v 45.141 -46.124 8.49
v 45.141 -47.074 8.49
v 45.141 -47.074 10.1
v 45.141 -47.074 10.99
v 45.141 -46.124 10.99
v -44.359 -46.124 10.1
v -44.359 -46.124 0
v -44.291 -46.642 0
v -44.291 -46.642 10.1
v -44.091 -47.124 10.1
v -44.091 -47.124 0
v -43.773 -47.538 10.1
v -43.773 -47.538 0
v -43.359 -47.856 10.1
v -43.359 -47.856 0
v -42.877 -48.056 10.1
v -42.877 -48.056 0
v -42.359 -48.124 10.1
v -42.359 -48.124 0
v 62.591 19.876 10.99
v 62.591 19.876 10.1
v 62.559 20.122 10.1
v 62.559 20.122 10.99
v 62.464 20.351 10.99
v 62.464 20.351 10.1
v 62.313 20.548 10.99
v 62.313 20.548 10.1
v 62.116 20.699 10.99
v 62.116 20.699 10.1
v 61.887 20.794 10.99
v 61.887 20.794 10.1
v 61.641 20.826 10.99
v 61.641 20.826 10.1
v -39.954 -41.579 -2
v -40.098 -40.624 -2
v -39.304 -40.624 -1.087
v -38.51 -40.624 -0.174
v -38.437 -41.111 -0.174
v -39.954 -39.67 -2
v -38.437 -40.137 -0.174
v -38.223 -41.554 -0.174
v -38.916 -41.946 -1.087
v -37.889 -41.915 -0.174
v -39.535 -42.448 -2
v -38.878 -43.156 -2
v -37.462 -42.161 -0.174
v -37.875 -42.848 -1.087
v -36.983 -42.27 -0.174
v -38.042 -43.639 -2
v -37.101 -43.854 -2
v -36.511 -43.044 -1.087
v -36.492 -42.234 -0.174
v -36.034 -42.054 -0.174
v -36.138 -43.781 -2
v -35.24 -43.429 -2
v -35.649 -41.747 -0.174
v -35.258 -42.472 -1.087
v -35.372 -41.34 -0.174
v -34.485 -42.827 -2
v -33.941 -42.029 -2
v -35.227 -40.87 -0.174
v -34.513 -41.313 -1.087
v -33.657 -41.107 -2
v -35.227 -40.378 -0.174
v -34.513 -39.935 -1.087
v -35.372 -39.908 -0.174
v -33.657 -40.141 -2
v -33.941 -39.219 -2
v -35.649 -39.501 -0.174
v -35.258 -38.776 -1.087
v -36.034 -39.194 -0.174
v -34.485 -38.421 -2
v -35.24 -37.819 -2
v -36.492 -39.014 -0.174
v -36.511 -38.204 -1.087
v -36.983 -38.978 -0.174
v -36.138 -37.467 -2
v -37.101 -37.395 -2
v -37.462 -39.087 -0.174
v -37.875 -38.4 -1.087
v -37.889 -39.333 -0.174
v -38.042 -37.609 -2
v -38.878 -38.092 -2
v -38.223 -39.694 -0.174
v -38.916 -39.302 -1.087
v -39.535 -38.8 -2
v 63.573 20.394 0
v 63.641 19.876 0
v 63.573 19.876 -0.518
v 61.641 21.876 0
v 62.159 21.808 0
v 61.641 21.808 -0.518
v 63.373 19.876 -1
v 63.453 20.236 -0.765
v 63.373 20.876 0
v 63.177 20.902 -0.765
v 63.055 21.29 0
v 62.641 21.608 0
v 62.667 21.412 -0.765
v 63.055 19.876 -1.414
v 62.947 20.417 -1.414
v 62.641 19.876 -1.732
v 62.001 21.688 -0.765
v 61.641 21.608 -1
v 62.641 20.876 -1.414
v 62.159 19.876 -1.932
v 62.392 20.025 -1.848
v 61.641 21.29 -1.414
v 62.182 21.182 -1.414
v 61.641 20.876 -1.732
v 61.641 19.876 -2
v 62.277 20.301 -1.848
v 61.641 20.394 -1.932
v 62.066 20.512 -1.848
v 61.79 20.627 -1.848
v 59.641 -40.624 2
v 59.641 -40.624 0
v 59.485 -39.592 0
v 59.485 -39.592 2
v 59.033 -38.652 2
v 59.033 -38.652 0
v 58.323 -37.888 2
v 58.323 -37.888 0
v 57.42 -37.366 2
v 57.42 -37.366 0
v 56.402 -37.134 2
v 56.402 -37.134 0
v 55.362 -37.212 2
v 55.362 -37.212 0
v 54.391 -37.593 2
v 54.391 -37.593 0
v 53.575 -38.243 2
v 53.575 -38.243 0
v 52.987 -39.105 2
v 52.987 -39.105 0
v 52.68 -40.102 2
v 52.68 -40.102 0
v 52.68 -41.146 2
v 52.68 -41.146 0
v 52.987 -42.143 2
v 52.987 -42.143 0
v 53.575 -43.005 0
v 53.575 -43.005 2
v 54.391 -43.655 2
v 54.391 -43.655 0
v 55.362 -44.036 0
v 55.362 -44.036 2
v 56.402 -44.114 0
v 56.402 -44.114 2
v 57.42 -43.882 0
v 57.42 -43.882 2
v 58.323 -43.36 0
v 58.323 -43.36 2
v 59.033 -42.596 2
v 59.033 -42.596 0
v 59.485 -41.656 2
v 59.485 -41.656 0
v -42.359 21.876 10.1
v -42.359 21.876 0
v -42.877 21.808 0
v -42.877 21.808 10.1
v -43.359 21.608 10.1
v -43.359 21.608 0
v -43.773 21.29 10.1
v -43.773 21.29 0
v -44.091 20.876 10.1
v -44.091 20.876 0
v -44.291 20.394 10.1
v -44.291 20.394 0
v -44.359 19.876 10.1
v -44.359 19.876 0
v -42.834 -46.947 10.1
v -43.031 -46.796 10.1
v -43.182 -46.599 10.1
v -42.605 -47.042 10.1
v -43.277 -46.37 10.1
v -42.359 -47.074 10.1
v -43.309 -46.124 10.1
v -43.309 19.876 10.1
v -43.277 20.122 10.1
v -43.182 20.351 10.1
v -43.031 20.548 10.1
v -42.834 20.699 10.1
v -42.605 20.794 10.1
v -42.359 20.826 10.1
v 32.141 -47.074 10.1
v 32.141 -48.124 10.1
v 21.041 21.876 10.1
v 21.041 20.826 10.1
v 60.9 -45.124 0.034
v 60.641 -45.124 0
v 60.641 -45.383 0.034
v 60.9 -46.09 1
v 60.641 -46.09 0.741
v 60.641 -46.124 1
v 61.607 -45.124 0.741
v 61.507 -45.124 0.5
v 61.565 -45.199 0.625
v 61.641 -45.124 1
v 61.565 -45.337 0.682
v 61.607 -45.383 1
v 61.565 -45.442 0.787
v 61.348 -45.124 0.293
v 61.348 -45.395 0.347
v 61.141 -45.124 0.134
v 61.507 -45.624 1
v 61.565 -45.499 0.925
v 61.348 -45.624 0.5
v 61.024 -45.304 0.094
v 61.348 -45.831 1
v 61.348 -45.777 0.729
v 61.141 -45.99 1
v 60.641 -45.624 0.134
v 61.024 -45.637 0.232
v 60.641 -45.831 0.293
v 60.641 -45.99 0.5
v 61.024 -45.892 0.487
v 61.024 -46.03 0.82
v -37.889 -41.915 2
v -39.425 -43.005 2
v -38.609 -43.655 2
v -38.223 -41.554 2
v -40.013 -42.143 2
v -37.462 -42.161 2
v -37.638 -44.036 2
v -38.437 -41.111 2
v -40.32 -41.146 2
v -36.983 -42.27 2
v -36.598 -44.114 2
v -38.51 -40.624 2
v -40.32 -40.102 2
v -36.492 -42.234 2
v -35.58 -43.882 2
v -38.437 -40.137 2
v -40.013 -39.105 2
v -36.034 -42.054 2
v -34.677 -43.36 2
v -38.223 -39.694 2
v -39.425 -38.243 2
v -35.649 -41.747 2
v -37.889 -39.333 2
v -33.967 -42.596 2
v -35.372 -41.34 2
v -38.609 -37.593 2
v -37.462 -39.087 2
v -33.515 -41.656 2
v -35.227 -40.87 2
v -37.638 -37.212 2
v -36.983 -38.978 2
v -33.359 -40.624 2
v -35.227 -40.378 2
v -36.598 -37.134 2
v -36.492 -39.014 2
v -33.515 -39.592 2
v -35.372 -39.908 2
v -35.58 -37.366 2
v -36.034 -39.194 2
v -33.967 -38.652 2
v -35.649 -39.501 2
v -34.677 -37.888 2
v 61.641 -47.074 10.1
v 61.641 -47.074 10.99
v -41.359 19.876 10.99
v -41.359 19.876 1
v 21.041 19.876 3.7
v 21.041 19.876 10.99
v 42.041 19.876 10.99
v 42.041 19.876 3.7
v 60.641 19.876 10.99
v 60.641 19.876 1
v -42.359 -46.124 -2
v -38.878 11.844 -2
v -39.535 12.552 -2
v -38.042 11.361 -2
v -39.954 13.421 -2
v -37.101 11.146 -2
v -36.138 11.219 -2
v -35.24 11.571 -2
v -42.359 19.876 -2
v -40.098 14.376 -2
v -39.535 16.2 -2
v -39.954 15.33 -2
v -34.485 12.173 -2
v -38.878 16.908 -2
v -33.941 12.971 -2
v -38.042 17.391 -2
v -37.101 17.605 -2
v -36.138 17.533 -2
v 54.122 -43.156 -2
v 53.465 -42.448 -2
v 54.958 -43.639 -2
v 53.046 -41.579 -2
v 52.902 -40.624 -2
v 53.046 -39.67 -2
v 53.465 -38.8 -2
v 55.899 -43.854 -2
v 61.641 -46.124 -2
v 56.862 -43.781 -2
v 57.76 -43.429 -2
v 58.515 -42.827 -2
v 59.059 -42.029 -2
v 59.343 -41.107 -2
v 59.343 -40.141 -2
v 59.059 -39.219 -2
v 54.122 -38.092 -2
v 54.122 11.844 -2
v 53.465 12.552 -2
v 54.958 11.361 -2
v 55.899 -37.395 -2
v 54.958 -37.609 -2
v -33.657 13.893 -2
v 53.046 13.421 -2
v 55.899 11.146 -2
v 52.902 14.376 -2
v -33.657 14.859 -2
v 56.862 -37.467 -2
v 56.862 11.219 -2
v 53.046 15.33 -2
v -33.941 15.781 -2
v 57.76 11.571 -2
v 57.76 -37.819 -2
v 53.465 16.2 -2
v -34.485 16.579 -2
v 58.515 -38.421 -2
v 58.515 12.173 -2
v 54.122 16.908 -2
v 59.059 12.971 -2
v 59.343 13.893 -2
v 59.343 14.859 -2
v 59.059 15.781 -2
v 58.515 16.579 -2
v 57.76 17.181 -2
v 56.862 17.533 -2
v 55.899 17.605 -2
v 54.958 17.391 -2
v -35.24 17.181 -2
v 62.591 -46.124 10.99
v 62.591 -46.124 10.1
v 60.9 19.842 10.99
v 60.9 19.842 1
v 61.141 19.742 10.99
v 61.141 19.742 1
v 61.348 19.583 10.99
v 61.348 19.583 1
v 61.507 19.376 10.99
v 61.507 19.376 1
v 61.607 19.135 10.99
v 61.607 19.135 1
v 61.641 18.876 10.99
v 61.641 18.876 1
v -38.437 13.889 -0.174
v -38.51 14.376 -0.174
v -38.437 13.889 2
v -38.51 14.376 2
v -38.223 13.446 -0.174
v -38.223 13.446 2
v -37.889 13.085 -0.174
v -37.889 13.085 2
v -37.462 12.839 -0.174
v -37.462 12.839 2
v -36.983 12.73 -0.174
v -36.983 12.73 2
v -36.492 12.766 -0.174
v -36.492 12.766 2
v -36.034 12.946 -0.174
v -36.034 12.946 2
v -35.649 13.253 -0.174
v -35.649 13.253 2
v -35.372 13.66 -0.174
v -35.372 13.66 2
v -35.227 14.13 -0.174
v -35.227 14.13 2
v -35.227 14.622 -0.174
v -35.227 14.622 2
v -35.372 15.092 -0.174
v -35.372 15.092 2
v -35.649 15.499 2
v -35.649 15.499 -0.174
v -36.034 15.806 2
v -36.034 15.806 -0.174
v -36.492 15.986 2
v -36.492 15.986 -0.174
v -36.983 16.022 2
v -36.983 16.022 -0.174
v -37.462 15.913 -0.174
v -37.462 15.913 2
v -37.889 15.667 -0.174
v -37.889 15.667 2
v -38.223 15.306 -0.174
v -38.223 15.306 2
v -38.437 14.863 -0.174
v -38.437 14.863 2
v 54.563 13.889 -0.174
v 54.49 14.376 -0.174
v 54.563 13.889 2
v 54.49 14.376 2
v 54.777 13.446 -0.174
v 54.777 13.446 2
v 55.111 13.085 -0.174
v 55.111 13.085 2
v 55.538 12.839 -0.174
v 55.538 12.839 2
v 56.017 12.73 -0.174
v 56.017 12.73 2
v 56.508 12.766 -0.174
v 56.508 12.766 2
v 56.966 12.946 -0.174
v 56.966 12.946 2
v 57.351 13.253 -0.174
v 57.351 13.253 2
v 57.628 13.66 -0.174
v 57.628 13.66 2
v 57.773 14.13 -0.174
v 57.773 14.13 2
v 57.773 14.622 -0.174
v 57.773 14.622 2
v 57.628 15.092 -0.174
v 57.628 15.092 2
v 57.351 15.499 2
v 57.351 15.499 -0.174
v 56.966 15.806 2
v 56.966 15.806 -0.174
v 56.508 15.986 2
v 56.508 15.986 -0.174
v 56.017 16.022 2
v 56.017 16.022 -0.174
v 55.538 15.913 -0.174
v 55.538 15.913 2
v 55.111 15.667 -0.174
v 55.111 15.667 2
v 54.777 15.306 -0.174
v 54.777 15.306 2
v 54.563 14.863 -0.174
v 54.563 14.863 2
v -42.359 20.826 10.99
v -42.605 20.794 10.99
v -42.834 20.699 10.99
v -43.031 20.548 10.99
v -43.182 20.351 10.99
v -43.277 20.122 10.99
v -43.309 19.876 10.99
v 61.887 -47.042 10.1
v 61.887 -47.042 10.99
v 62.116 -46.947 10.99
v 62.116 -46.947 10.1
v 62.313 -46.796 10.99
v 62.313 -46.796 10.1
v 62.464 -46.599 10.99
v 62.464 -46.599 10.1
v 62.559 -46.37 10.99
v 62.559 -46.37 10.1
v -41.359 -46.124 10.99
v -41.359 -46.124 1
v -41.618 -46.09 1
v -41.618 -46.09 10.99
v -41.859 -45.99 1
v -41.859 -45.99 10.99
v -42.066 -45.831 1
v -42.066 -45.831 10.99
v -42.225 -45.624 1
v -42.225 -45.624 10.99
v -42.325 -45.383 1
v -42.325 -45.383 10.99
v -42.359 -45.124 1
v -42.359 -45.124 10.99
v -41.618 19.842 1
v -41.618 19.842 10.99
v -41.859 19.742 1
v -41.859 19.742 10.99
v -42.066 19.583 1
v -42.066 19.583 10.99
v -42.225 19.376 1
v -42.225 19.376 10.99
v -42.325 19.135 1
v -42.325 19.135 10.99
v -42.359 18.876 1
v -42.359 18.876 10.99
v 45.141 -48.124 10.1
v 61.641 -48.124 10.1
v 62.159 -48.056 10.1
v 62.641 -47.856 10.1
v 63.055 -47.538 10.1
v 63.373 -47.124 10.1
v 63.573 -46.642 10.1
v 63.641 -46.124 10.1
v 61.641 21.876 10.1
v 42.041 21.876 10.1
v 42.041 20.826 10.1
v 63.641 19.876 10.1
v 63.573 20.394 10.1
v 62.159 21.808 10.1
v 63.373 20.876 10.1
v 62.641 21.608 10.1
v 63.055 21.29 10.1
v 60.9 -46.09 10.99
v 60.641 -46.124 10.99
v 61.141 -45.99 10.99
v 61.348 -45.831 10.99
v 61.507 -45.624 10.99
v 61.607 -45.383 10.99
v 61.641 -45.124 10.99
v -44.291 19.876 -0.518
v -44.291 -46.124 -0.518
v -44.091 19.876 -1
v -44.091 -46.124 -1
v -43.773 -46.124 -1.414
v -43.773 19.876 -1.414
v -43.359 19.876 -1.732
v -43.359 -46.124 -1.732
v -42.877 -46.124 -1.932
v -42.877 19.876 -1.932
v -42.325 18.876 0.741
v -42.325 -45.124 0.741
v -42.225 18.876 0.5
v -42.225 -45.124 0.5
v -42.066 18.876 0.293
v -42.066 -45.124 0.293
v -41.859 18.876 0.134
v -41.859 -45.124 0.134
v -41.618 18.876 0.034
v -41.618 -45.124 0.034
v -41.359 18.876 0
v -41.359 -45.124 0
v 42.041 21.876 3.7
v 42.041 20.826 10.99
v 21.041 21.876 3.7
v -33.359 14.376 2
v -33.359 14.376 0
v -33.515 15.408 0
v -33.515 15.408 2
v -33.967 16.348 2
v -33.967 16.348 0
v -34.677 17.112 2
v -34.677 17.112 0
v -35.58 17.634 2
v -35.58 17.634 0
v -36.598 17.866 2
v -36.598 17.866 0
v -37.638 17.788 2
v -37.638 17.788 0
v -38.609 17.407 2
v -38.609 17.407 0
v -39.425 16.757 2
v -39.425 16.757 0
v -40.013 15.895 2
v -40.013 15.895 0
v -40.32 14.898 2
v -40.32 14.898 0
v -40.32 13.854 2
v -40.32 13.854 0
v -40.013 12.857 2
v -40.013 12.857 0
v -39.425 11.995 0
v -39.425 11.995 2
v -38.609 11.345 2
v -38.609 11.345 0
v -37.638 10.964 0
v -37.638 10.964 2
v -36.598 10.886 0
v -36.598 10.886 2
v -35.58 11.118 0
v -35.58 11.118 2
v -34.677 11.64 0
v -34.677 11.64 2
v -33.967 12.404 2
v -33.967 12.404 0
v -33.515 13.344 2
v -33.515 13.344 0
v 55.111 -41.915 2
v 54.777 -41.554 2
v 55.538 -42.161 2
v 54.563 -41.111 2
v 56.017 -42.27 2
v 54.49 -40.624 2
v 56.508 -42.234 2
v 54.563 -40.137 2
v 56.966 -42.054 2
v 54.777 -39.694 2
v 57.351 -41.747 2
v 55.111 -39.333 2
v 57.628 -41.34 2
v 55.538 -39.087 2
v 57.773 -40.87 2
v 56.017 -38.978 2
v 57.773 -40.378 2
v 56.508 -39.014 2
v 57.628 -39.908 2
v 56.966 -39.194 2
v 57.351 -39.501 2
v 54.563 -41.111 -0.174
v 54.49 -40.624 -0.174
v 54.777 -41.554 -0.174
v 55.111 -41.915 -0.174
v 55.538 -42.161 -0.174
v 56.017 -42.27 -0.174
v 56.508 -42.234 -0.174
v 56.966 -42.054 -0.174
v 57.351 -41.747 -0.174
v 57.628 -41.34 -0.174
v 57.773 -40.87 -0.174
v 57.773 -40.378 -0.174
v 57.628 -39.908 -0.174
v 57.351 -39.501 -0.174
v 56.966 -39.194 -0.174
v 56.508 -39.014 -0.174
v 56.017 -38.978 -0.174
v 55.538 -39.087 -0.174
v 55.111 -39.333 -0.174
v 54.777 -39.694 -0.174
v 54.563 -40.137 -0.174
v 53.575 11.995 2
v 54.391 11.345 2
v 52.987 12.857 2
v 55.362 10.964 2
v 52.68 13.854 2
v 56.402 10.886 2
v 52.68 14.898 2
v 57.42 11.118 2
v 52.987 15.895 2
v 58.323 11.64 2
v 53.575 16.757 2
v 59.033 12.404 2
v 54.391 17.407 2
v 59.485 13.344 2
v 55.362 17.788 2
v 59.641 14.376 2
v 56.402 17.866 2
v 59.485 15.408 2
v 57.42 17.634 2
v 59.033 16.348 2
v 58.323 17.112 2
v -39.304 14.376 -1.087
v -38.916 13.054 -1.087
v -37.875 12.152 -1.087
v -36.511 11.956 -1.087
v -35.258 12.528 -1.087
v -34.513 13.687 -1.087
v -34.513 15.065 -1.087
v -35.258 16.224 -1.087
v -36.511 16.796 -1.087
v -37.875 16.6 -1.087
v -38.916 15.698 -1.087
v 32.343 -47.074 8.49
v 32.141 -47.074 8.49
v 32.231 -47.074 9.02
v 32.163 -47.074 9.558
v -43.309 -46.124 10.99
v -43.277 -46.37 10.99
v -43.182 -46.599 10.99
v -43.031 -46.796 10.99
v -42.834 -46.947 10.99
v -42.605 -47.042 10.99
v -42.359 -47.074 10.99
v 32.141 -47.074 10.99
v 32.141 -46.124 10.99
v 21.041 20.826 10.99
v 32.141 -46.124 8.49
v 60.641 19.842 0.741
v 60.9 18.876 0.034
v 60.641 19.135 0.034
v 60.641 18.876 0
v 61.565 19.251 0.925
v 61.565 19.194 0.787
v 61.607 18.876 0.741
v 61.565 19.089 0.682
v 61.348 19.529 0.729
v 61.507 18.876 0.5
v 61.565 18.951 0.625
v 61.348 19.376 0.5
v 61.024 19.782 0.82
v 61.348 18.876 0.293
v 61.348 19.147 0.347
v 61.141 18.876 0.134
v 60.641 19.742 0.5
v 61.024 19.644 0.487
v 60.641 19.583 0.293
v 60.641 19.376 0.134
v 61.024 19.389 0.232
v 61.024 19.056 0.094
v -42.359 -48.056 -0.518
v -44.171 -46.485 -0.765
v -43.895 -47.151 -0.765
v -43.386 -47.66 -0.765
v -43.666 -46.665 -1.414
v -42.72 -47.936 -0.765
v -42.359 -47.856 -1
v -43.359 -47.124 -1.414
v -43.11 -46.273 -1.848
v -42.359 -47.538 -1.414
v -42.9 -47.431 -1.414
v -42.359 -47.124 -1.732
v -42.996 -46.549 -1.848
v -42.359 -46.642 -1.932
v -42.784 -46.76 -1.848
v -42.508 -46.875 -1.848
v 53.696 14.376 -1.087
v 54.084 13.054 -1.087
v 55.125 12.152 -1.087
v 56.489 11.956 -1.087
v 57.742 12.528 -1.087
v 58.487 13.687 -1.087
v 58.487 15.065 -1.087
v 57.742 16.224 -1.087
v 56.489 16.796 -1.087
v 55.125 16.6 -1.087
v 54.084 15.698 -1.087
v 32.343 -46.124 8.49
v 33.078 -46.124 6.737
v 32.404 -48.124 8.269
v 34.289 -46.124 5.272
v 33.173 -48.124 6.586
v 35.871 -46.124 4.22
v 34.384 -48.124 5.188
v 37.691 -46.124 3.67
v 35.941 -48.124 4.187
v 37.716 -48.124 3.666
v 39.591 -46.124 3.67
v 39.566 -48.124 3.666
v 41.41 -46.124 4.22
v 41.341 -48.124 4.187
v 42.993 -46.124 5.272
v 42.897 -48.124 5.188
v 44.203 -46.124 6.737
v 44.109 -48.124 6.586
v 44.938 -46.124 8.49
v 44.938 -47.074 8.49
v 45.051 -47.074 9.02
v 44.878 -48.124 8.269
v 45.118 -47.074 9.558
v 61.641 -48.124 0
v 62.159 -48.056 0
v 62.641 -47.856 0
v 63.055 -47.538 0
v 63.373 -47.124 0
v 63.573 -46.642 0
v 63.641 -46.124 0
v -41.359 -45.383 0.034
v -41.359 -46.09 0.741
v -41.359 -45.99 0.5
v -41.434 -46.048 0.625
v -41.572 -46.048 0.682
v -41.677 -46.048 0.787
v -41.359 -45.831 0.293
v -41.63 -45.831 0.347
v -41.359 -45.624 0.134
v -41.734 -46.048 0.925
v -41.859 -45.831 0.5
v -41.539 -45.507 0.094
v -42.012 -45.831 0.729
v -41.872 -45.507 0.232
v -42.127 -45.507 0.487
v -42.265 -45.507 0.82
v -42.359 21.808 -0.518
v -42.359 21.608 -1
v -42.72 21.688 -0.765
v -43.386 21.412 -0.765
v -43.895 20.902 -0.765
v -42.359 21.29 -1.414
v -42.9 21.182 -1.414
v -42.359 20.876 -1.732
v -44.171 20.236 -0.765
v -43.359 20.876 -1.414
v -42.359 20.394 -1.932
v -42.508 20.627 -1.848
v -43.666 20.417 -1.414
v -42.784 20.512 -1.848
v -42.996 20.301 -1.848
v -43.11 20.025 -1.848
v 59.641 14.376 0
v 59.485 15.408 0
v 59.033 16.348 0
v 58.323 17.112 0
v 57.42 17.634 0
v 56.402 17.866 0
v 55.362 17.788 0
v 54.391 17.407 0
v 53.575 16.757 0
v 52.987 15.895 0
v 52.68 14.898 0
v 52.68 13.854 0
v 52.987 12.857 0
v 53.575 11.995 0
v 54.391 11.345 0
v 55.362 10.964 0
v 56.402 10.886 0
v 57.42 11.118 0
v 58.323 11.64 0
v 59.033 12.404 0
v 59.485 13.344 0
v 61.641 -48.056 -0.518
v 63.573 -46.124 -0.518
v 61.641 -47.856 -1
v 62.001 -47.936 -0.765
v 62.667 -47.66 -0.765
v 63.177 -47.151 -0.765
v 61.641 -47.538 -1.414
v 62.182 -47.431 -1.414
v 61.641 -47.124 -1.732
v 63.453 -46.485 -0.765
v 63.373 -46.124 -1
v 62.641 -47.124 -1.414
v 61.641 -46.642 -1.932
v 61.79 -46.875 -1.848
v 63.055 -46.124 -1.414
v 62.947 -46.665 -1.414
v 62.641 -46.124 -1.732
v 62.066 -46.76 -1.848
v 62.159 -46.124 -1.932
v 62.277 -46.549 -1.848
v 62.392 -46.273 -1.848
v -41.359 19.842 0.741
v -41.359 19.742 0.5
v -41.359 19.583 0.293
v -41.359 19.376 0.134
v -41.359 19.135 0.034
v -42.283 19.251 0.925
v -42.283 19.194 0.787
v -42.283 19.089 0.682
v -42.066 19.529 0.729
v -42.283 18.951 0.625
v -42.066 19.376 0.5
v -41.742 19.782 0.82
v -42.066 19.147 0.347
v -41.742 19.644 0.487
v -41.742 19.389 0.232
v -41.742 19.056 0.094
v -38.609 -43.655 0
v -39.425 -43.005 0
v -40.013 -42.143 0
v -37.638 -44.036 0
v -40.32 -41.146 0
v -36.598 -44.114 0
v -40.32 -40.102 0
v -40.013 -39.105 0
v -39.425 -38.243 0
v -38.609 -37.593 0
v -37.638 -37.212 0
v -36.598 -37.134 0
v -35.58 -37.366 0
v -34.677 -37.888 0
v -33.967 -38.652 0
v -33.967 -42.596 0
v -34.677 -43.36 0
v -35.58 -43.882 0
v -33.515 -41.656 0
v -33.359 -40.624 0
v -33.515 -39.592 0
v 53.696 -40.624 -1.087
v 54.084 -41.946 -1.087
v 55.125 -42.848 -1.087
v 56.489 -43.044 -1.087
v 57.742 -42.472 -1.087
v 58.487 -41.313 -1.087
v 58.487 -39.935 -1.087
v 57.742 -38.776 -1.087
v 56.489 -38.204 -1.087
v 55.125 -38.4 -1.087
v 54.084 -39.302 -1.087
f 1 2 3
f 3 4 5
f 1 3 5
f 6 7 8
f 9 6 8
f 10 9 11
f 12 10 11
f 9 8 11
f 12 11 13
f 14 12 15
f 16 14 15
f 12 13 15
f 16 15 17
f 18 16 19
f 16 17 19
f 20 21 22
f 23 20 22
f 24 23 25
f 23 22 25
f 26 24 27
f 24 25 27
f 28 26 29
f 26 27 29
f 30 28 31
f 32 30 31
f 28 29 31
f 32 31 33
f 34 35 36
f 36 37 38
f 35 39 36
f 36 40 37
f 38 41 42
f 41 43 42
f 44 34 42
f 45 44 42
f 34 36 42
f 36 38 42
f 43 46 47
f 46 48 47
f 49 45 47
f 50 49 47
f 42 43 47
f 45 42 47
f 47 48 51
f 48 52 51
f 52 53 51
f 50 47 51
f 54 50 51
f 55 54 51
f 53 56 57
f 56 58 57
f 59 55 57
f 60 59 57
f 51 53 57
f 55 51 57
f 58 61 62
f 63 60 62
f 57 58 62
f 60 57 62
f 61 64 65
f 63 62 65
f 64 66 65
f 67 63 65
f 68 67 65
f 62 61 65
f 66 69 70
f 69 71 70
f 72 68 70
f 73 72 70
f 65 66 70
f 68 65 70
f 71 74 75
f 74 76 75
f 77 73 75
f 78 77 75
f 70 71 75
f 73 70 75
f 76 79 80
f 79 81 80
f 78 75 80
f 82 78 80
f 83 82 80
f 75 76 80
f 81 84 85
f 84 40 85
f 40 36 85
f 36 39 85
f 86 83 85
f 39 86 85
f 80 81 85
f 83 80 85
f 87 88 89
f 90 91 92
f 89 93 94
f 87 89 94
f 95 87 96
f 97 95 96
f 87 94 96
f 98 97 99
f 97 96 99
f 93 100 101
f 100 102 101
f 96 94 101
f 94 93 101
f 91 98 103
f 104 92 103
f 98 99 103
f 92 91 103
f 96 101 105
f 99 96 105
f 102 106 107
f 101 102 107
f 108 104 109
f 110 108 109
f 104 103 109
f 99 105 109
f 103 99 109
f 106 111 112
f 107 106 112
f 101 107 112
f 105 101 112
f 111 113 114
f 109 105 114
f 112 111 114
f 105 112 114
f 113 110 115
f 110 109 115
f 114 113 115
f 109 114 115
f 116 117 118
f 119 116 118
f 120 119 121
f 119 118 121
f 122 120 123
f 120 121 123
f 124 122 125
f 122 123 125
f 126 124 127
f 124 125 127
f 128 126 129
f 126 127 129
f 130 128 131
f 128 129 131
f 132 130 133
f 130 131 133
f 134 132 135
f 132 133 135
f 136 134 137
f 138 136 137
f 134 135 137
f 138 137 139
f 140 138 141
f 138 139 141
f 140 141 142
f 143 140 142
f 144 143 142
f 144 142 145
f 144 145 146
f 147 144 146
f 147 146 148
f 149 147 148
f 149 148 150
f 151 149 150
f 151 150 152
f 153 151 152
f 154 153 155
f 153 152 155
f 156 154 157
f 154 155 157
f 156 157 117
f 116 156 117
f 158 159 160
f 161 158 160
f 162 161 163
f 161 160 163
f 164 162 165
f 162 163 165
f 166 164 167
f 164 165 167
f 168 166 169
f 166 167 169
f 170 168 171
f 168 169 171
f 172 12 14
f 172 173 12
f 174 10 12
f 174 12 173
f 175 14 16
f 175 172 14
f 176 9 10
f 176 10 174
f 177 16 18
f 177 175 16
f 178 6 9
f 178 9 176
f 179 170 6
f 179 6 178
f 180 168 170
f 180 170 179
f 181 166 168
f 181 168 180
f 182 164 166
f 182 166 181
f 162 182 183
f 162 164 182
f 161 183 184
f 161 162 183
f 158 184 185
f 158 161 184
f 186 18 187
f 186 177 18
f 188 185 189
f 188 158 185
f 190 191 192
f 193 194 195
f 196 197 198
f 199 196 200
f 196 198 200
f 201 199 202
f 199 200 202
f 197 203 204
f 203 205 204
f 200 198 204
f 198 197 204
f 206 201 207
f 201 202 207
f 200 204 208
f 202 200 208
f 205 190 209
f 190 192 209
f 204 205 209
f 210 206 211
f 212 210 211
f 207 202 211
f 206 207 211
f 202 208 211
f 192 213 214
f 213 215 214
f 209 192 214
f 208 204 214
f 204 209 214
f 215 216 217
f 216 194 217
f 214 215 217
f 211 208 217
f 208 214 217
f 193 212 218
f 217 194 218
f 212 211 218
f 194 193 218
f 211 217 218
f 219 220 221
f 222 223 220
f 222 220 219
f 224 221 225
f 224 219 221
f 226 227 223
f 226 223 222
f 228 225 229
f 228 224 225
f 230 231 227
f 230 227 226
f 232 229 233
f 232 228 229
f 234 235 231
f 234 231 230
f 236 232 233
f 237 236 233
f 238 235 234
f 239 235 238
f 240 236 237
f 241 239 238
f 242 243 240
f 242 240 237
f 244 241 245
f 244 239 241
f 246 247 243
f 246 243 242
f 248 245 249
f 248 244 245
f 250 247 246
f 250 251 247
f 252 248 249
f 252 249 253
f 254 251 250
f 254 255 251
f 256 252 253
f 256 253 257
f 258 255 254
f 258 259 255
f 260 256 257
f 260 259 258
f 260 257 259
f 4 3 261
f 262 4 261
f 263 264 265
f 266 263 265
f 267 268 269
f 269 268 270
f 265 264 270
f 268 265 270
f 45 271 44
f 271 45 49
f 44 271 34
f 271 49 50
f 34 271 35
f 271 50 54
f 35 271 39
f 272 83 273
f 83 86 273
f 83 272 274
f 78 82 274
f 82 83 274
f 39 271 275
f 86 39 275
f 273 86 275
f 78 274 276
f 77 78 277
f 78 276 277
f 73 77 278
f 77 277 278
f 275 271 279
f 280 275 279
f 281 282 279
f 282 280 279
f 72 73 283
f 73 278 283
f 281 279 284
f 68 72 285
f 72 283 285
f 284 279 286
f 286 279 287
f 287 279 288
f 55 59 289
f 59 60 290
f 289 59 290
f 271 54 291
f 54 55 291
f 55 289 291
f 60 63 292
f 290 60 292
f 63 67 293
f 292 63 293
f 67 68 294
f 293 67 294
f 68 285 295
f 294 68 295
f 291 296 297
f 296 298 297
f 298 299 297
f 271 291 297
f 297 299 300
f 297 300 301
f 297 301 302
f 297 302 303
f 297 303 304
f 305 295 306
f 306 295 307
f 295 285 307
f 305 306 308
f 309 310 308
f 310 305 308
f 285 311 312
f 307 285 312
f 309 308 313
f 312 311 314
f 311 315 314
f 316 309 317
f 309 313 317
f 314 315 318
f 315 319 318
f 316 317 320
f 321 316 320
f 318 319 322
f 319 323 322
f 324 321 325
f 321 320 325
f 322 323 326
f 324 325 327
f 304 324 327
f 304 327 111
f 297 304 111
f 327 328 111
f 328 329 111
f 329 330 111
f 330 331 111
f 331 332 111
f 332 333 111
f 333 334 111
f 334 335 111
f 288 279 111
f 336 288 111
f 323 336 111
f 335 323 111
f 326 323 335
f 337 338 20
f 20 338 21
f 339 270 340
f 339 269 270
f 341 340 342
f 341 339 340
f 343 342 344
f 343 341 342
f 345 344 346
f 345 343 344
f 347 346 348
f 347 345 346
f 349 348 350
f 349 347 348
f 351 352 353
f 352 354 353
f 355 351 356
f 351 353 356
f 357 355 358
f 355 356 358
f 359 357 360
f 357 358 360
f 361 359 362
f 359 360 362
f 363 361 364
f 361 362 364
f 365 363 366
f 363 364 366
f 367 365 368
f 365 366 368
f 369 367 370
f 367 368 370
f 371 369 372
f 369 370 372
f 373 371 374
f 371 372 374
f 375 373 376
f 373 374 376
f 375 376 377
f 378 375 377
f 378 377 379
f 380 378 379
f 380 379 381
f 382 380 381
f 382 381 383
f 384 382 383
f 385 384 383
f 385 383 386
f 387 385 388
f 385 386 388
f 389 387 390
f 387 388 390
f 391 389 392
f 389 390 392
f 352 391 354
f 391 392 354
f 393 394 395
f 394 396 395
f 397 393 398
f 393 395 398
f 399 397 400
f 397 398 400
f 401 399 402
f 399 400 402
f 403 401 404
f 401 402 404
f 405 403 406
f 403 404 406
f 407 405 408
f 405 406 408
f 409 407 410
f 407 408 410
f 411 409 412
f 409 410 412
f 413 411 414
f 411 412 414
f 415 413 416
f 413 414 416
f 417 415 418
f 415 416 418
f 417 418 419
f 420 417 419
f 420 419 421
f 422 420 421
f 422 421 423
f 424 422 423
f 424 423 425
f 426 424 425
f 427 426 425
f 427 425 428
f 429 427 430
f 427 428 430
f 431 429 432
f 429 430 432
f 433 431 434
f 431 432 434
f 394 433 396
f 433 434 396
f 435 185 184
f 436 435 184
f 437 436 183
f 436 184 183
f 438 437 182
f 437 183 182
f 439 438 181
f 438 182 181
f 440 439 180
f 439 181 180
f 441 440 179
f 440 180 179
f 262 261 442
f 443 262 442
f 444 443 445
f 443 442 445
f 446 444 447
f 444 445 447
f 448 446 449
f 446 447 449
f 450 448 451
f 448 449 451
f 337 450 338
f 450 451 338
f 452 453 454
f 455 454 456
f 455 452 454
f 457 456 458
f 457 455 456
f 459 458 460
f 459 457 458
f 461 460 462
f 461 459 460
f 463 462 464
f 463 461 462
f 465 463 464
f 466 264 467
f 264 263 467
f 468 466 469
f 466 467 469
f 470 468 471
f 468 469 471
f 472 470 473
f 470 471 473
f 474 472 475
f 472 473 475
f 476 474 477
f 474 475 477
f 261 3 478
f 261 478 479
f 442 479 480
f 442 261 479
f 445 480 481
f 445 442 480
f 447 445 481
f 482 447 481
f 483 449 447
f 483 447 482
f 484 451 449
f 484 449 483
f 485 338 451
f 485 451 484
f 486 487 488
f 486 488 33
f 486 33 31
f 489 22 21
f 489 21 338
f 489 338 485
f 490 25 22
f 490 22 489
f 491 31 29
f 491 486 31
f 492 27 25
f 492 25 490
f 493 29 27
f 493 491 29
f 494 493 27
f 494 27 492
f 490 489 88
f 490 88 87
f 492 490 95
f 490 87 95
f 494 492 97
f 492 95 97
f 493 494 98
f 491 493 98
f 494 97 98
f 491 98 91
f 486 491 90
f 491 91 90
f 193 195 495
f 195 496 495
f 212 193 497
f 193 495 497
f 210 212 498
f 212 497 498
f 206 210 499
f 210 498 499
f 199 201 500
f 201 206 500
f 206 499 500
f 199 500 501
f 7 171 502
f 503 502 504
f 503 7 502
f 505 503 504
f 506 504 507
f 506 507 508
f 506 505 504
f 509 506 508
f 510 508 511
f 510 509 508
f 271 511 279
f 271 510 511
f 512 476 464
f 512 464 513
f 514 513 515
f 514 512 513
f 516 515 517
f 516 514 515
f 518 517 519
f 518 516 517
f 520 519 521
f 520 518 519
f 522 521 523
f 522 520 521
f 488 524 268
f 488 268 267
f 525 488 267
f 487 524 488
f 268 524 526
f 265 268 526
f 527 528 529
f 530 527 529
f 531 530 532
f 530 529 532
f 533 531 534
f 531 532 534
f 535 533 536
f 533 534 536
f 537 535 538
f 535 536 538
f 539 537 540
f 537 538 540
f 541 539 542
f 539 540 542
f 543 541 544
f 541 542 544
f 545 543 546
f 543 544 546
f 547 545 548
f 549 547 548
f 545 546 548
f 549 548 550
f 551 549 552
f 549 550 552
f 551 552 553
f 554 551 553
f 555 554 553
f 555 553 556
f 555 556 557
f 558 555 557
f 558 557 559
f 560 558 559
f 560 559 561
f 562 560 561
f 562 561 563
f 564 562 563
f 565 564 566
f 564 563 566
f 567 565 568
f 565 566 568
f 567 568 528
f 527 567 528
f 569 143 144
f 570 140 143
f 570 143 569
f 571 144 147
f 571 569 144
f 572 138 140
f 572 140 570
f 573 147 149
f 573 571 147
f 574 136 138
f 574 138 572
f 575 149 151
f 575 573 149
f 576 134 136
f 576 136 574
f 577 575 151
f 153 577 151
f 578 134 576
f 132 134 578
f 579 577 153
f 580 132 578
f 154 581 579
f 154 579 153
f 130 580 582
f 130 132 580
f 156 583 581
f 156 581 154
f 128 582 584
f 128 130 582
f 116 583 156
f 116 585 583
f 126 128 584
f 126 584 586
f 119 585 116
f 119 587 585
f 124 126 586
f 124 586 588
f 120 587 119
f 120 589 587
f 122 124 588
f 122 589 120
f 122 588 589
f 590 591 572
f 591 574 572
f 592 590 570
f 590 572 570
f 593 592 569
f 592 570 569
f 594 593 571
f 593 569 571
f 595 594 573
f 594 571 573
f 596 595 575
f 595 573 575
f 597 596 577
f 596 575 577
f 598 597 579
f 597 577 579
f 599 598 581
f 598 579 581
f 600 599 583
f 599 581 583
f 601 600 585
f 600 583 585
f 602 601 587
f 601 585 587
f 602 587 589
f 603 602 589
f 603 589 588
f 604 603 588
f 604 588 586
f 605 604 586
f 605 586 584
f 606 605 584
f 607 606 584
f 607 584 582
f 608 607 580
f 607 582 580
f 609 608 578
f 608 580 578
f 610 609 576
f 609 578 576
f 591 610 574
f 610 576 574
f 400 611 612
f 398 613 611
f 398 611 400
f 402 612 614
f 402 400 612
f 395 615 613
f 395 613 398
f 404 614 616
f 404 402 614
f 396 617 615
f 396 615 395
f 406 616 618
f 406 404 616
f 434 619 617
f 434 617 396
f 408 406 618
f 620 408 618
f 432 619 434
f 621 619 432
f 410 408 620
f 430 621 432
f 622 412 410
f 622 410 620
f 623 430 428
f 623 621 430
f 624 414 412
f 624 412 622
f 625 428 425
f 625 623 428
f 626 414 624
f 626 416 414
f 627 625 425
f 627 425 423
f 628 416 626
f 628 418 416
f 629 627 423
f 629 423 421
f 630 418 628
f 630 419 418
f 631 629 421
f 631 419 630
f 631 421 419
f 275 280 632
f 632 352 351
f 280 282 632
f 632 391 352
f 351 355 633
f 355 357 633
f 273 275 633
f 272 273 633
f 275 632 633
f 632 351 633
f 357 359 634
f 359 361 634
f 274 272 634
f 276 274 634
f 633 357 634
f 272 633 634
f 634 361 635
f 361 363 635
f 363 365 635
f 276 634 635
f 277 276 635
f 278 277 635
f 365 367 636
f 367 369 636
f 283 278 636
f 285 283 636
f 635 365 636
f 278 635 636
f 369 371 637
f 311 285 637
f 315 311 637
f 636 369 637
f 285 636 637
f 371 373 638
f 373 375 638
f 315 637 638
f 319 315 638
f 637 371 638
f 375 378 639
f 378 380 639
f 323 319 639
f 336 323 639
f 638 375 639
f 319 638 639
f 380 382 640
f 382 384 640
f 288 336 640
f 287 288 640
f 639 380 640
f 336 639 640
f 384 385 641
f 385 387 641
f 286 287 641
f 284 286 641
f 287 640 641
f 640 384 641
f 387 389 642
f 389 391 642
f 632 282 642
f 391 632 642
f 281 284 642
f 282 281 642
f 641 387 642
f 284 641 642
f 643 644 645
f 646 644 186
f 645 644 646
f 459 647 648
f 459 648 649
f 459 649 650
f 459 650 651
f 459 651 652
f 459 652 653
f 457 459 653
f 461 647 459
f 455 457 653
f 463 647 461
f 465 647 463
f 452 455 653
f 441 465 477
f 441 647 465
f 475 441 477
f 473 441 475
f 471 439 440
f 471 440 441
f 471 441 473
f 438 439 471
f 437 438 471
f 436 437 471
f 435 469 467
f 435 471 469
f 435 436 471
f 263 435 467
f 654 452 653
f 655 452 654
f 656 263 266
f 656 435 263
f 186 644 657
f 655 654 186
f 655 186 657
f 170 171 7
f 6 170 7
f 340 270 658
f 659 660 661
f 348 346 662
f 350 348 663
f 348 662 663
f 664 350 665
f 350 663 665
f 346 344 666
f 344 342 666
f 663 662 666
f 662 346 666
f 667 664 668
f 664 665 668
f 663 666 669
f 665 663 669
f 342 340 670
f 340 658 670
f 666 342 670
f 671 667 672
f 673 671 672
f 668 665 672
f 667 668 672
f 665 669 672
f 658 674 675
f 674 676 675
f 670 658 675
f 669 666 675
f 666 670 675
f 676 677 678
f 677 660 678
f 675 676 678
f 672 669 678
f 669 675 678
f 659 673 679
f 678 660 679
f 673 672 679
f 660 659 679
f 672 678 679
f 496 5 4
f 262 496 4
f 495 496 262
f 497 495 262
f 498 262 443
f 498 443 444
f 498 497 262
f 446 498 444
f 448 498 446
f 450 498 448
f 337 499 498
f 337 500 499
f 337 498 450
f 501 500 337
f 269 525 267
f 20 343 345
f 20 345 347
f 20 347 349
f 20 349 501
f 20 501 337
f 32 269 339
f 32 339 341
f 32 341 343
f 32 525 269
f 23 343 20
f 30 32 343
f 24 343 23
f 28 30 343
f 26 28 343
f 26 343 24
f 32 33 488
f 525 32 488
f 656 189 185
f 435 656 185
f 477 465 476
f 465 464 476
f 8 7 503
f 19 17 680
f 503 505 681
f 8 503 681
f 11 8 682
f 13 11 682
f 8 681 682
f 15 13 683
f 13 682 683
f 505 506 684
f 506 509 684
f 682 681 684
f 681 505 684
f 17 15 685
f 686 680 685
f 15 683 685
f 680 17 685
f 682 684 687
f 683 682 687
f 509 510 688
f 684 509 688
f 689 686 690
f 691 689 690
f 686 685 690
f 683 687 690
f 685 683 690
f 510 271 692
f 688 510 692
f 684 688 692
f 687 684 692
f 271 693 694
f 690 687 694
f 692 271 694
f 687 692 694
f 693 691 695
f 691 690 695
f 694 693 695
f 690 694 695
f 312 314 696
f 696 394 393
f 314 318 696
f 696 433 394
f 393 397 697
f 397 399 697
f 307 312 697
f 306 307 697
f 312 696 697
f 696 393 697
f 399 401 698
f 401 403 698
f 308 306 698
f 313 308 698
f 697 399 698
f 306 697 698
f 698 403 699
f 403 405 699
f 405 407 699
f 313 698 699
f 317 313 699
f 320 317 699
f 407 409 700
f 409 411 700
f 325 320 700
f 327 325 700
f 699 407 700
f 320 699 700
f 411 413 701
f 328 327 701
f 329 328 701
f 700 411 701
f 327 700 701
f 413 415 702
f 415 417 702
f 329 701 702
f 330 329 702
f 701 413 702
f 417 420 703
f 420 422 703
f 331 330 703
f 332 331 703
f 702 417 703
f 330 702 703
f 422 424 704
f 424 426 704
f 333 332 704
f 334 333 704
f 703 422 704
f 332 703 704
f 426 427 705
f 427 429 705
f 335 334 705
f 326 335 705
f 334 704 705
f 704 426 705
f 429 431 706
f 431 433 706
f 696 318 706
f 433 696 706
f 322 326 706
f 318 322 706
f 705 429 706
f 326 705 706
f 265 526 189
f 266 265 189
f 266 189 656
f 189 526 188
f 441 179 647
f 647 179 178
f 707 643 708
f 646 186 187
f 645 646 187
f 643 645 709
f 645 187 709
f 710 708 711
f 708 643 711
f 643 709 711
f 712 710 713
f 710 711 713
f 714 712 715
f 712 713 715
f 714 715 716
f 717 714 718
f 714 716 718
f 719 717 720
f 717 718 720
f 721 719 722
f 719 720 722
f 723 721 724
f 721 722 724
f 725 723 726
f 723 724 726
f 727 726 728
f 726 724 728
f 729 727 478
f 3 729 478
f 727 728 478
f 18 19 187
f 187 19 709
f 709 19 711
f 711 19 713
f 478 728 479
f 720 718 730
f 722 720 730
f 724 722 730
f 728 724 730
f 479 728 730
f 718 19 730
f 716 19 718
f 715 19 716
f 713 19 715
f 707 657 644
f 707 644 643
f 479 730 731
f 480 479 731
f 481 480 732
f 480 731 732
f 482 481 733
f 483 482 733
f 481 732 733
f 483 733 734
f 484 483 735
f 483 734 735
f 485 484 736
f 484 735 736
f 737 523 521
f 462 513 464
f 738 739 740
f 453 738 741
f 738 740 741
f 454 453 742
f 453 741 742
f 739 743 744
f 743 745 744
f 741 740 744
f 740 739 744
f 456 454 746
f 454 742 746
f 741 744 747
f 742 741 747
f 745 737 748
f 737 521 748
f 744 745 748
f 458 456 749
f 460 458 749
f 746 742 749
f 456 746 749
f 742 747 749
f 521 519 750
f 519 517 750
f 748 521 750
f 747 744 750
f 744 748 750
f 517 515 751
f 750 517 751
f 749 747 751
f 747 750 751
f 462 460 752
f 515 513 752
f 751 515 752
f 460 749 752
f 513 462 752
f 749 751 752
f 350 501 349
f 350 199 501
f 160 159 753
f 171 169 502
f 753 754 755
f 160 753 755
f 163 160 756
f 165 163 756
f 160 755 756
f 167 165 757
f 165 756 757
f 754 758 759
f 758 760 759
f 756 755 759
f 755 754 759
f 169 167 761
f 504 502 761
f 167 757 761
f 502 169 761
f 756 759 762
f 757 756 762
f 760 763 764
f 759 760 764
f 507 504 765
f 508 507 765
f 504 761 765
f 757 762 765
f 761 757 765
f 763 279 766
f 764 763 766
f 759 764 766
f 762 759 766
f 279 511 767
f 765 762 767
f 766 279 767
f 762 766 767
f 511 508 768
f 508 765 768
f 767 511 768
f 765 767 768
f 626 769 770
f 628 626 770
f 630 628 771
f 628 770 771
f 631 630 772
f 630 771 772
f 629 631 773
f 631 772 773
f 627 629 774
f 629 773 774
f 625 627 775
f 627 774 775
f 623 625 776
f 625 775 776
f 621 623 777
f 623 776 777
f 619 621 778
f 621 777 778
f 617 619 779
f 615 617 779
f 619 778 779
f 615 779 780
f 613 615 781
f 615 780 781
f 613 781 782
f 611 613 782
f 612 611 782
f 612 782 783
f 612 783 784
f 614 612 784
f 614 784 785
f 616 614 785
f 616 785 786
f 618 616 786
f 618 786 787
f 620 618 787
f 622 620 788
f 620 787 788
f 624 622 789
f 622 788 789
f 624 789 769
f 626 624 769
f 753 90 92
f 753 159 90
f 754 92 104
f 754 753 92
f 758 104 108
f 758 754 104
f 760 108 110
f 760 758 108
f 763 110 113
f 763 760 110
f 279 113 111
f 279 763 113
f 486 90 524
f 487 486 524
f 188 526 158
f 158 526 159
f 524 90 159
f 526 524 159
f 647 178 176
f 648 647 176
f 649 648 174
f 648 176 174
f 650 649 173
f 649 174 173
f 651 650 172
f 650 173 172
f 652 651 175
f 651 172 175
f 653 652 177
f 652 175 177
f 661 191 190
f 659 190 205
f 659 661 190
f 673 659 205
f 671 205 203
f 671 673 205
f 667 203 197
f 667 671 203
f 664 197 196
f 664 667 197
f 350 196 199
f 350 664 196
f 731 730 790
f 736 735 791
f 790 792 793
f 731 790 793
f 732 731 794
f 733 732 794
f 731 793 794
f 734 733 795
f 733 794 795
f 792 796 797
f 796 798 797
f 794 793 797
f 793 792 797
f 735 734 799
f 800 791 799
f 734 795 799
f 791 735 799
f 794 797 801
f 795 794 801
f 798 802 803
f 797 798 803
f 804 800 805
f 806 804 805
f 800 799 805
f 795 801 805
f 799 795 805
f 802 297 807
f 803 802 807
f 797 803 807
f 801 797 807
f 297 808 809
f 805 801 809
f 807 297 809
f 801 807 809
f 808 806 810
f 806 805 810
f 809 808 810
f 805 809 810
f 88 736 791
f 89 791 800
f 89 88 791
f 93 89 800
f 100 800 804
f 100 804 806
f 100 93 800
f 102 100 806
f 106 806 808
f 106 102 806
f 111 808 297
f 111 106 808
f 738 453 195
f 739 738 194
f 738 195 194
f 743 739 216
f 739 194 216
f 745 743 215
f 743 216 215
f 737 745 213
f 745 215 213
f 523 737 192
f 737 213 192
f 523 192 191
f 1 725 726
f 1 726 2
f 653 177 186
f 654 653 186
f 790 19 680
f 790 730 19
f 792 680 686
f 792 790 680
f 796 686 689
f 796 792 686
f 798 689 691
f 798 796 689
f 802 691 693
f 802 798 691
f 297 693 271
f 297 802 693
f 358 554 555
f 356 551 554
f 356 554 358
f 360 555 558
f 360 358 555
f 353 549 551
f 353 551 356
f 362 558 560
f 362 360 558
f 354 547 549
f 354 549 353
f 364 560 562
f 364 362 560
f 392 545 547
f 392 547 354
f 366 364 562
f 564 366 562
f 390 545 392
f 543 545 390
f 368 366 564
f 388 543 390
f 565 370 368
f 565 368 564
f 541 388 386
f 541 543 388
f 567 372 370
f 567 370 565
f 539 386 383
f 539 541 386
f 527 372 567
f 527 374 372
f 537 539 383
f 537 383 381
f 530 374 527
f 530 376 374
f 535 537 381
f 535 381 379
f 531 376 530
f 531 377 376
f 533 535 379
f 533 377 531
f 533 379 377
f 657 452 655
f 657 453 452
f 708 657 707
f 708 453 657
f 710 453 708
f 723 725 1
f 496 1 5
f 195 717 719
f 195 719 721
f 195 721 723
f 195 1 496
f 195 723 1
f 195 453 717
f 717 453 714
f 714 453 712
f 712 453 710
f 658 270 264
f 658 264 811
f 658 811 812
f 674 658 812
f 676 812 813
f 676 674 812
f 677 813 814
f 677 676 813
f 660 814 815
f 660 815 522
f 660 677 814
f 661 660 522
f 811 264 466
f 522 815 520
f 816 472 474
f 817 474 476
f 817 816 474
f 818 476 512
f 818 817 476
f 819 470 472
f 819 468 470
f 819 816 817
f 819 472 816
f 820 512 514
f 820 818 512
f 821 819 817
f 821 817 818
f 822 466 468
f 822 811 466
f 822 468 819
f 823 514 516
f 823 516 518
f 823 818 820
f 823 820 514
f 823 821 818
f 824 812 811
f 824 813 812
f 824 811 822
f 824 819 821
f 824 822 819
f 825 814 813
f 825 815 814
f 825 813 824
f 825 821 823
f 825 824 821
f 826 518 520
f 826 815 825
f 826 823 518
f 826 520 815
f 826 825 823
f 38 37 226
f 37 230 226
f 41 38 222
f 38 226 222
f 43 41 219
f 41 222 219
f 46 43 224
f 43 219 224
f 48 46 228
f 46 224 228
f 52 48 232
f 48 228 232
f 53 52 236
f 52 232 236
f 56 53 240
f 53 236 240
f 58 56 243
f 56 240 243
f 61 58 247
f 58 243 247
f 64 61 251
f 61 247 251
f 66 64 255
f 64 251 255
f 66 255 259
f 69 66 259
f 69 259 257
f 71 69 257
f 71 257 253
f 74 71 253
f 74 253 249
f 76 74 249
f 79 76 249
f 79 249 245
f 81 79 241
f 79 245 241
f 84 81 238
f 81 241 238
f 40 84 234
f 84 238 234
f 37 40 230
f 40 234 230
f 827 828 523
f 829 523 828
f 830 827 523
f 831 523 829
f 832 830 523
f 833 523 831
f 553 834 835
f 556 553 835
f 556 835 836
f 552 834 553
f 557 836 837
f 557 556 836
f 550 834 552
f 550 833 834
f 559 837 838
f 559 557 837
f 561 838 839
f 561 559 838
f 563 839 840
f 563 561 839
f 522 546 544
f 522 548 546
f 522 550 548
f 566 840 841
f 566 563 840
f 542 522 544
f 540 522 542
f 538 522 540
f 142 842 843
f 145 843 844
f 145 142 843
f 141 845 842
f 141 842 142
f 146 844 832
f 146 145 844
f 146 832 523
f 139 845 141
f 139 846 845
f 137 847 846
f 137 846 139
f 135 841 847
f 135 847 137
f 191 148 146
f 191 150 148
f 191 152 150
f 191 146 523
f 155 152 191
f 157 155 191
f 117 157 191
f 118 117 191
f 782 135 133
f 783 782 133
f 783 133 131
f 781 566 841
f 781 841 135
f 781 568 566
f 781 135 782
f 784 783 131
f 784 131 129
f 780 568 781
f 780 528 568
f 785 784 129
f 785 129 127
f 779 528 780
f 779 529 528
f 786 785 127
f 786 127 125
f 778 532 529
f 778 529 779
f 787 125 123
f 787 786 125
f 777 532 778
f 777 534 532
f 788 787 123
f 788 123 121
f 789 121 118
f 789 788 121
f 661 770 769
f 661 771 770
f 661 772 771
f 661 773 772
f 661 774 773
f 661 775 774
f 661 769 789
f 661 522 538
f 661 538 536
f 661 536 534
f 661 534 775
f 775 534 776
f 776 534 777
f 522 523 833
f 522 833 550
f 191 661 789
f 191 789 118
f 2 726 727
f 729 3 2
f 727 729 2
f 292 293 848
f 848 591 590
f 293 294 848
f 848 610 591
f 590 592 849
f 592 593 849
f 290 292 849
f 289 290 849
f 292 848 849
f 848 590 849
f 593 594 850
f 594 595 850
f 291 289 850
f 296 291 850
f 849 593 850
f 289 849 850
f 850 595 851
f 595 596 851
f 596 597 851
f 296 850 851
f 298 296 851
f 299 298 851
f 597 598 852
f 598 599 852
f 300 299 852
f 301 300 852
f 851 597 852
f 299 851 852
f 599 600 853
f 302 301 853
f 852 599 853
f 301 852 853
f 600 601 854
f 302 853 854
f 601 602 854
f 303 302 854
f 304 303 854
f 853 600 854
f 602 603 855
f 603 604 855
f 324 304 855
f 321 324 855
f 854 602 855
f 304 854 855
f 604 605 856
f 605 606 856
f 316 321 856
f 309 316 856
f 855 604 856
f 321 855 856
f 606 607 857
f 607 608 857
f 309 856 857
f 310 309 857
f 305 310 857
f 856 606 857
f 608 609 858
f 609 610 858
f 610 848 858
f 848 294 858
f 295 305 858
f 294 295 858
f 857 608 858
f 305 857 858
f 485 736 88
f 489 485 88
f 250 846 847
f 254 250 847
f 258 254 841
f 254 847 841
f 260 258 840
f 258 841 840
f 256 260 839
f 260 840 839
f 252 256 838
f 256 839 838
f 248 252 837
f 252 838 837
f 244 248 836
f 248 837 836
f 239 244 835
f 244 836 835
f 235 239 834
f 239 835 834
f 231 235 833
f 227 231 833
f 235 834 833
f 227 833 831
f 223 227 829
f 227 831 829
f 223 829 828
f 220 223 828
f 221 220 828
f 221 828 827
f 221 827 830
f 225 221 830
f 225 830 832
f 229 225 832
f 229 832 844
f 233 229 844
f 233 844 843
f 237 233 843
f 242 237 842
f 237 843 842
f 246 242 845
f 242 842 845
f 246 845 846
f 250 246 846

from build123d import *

# Parameters (mm, degrees)
F0_W           = 104
F0_H           = 66
F0_R           = 3
F1_DEPTH       = 2
F2_DEPTH       = 10.99
F3_DEPTH       = 10.1
F4_R           = 3.5
F5_DEPTH       = 2
F7_D           = 3.302
F7_CSINK_D     = 6.477
F7_CSINK_ANGLE = 82
F8_W           = 21
F8_H           = 6.4
F9_DEPTH       = 2.5
F10_W          = 13
F10_H          = 0.95
F11_DEPTH      = 2.5
F13_DEPTH      = 2.5
F14_R          = 2
F15_R          = 1
F16_W          = 21
F16_H          = 0.89
F17_DEPTH      = 2.5


# Not quite as in the source:
# - a feature names something its author has since deleted; it is built from what else it names


with BuildPart() as f1:
    # F0 (on Top) → F1 (new body)
    with BuildSketch(Plane.XY):
        with BuildLine():
            Line((61.6408709802, 21.8759292028), (-42.3591290198, 21.8759292028))
            ThreePointArc((-42.3591290198, 21.8759292028), (-43.7733425821, 21.2901427652), (-44.3591290198, 19.8759292028))
            Line((-44.3591290198, 19.8759292028), (-44.3591290198, -46.1240707972))
            ThreePointArc((-44.3591290198, -46.1240707972), (-43.7733425821, -47.5382843595), (-42.3591290198, -48.1240707972))
            Line((-42.3591290198, -48.1240707972), (61.6408709802, -48.1240707972))
            ThreePointArc((61.6408709802, -48.1240707972), (63.0550845426, -47.5382843595), (63.6408709802, -46.1240707972))
            Line((63.6408709802, -46.1240707972), (63.6408709802, 19.8759292028))
            ThreePointArc((63.6408709802, 19.8759292028), (63.0550845426, 21.2901427652), (61.6408709802, 21.8759292028))
        make_face()
        with BuildLine():
            ThreePointArc((-43.3091290198, 19.8759292028), (-43.0308804619, 20.547680645), (-42.3591290198, 20.8259292028))
            Line((-42.3591290198, 20.8259292028), (61.6408709802, 20.8259292028))
            ThreePointArc((61.6408709802, 20.8259292028), (62.3126224224, 20.547680645), (62.5908709802, 19.8759292028))
            Line((62.5908709802, 19.8759292028), (62.5908709802, -46.1240707972))
            ThreePointArc((62.5908709802, -46.1240707972), (62.3126224224, -46.7958222393), (61.6408709802, -47.0740707972))
            Line((61.6408709802, -47.0740707972), (-42.3591290198, -47.0740707972))
            ThreePointArc((-42.3591290198, -47.0740707972), (-43.0308804619, -46.7958222393), (-43.3091290198, -46.1240707972))
            Line((-43.3091290198, -46.1240707972), (-43.3091290198, 19.8759292028))
        make_face(mode=Mode.SUBTRACT)
        with BuildLine():
            Line((61.6408709802, 20.8259292028), (-42.3591290198, 20.8259292028))
            ThreePointArc((-42.3591290198, 20.8259292028), (-43.0308804619, 20.547680645), (-43.3091290198, 19.8759292028))
            Line((-43.3091290198, 19.8759292028), (-43.3091290198, -46.1240707972))
            ThreePointArc((-43.3091290198, -46.1240707972), (-43.0308804619, -46.7958222393), (-42.3591290198, -47.0740707972))
            Line((-42.3591290198, -47.0740707972), (61.6408709802, -47.0740707972))
            ThreePointArc((61.6408709802, -47.0740707972), (62.3126224224, -46.7958222393), (62.5908709802, -46.1240707972))
            Line((62.5908709802, -46.1240707972), (62.5908709802, 19.8759292028))
            ThreePointArc((62.5908709802, 19.8759292028), (62.3126224224, 20.547680645), (61.6408709802, 20.8259292028))
        make_face()
        with Locations((9.6408709802, -13.1240707972)):
            Rectangle(F0_W, F0_H, mode=Mode.SUBTRACT)
        with Locations((9.6408709802, -13.1240707972)):
            Rectangle(F0_W, F0_H)
        with Locations((-36.8591290198, -40.6240707972)):
            Circle(F0_R, mode=Mode.SUBTRACT)
        with Locations((57.1408709802, -40.6240707972)):
            Circle(F0_R, mode=Mode.SUBTRACT)
        with Locations((-36.8591290198, 14.3759292028)):
            Circle(F0_R, mode=Mode.SUBTRACT)
        with Locations((57.1408709802, 14.3759292028)):
            Circle(F0_R, mode=Mode.SUBTRACT)
        with Locations((-36.8591290198, -40.6240707972)):
            Circle(F0_R)
        with Locations((57.1408709802, -40.6240707972)):
            Circle(F0_R)
        with Locations((-36.8591290198, 14.3759292028)):
            Circle(F0_R)
        with Locations((57.1408709802, 14.3759292028)):
            Circle(F0_R)
    extrude(amount=-F1_DEPTH)

    # F0 (on Top) → F2 (join)
    with BuildSketch(Plane.XY):
        with BuildLine():
            Line((61.6408709802, 20.8259292028), (-42.3591290198, 20.8259292028))
            ThreePointArc((-42.3591290198, 20.8259292028), (-43.0308804619, 20.547680645), (-43.3091290198, 19.8759292028))
            Line((-43.3091290198, 19.8759292028), (-43.3091290198, -46.1240707972))
            ThreePointArc((-43.3091290198, -46.1240707972), (-43.0308804619, -46.7958222393), (-42.3591290198, -47.0740707972))
            Line((-42.3591290198, -47.0740707972), (61.6408709802, -47.0740707972))
            ThreePointArc((61.6408709802, -47.0740707972), (62.3126224224, -46.7958222393), (62.5908709802, -46.1240707972))
            Line((62.5908709802, -46.1240707972), (62.5908709802, 19.8759292028))
            ThreePointArc((62.5908709802, 19.8759292028), (62.3126224224, 20.547680645), (61.6408709802, 20.8259292028))
        make_face()
        with Locations((9.6408709802, -13.1240707972)):
            Rectangle(F0_W, F0_H, mode=Mode.SUBTRACT)
    extrude(amount=F2_DEPTH)

    # F0 (on Top) → F3 (join)
    with BuildSketch(Plane.XY):
        with BuildLine():
            Line((61.6408709802, 21.8759292028), (-42.3591290198, 21.8759292028))
            ThreePointArc((-42.3591290198, 21.8759292028), (-43.7733425821, 21.2901427652), (-44.3591290198, 19.8759292028))
            Line((-44.3591290198, 19.8759292028), (-44.3591290198, -46.1240707972))
            ThreePointArc((-44.3591290198, -46.1240707972), (-43.7733425821, -47.5382843595), (-42.3591290198, -48.1240707972))
            Line((-42.3591290198, -48.1240707972), (61.6408709802, -48.1240707972))
            ThreePointArc((61.6408709802, -48.1240707972), (63.0550845426, -47.5382843595), (63.6408709802, -46.1240707972))
            Line((63.6408709802, -46.1240707972), (63.6408709802, 19.8759292028))
            ThreePointArc((63.6408709802, 19.8759292028), (63.0550845426, 21.2901427652), (61.6408709802, 21.8759292028))
        make_face()
        with BuildLine():
            ThreePointArc((-43.3091290198, 19.8759292028), (-43.0308804619, 20.547680645), (-42.3591290198, 20.8259292028))
            Line((-42.3591290198, 20.8259292028), (61.6408709802, 20.8259292028))
            ThreePointArc((61.6408709802, 20.8259292028), (62.3126224224, 20.547680645), (62.5908709802, 19.8759292028))
            Line((62.5908709802, 19.8759292028), (62.5908709802, -46.1240707972))
            ThreePointArc((62.5908709802, -46.1240707972), (62.3126224224, -46.7958222393), (61.6408709802, -47.0740707972))
            Line((61.6408709802, -47.0740707972), (-42.3591290198, -47.0740707972))
            ThreePointArc((-42.3591290198, -47.0740707972), (-43.0308804619, -46.7958222393), (-43.3091290198, -46.1240707972))
            Line((-43.3091290198, -46.1240707972), (-43.3091290198, 19.8759292028))
        make_face(mode=Mode.SUBTRACT)
    extrude(amount=F3_DEPTH)

    # F4 (on face) → F5 (join)
    with BuildSketch(Plane.XY):
        with Locations((-36.8591290198, 14.3759292028)):
            Circle(F4_R)
        with Locations((56.1408709802, 14.3759292028)):
            Circle(F4_R)
        with Locations((56.1408709802, -40.6240707972)):
            Circle(F4_R)
        with Locations((-36.8591290198, -40.6240707972)):
            Circle(F4_R)
    extrude(amount=F5_DEPTH)

    # F7 (through all)
    with Locations(Plane(origin=(0, 0, -2), x_dir=(1, 0, 0), z_dir=(0, 0, -1))):
        with Locations((-36.8591290198, 40.6240707972), (56.1408709802, 40.6240707972), (56.1408709802, -14.3759292028), (-36.8591290198, -14.3759292028)):
            CounterSinkHole(F7_D / 2, F7_CSINK_D / 2, counter_sink_angle=F7_CSINK_ANGLE)

    # F8 (on face) → F9 (cut)
    with BuildSketch(Plane(origin=(0, 21.8759292028, 0), x_dir=(-1, 0, 0), z_dir=(0, 1, 0))):
        with Locations((-31.5408709802, 6.9)):
            Rectangle(F8_W, F8_H)
    extrude(amount=-F9_DEPTH, mode=Mode.SUBTRACT)

    # F10 (on face) → F11 (cut)
    with BuildSketch(Plane.XY.offset(10.99)):
        with Locations((38.6408709802, -46.5990707972)):
            Rectangle(F10_W, F10_H)
    extrude(amount=-F11_DEPTH, mode=Mode.SUBTRACT)

    # F12 (on face) → F13 (cut)
    with BuildSketch(Plane.XZ.offset(48.1240707972)):
        with BuildLine():
            ThreePointArc((32.1408709802, 10.1), (38.6408709802, 3.6), (45.1408709802, 10.1))
            Line((45.1408709802, 10.1), (32.1408709802, 10.1))
        make_face()
    extrude(amount=-F13_DEPTH, mode=Mode.SUBTRACT)

    # F14
    f14_edges = [f1.edges().sort_by_distance(p)[0] for p in [
        (63.640871, -13.124071, -2),
        (9.640871, 21.875929, -2),
        (-44.359129, -13.124071, -2),
        (9.640871, -48.124071, -2),
        (63.055085, 21.290143, -2),
        (-43.773343, 21.290143, -2),
        (63.055085, -47.538284, -2),
        (-43.773343, -47.538284, -2),
    ]]
    fillet(f14_edges, radius=F14_R)

    # F15
    f15_edges = [f1.edges().sort_by_distance(p)[0] for p in [
        (9.640871, 19.875929, 0),
        (-42.359129, 19.875929, 5.495),
        (-42.359129, -13.124071, 0),
        (9.640871, -46.124071, 0),
        (-42.359129, -46.124071, 5.495),
        (61.640871, 19.875929, 5.495),
        (61.640871, -13.124071, 0),
        (61.640871, -46.124071, 5.495),
    ]]
    fillet(f15_edges, radius=F15_R)

    # F16 (on face) → F17 (cut)
    with BuildSketch(Plane(origin=(0, 20.8259292028, 0), x_dir=(-1, 0, 0), z_dir=(0, 1, 0))):
        with Locations((-31.5408709802, 10.545)):
            Rectangle(F16_W, F16_H)
    extrude(amount=-F17_DEPTH, mode=Mode.SUBTRACT)


solid = f1.part
